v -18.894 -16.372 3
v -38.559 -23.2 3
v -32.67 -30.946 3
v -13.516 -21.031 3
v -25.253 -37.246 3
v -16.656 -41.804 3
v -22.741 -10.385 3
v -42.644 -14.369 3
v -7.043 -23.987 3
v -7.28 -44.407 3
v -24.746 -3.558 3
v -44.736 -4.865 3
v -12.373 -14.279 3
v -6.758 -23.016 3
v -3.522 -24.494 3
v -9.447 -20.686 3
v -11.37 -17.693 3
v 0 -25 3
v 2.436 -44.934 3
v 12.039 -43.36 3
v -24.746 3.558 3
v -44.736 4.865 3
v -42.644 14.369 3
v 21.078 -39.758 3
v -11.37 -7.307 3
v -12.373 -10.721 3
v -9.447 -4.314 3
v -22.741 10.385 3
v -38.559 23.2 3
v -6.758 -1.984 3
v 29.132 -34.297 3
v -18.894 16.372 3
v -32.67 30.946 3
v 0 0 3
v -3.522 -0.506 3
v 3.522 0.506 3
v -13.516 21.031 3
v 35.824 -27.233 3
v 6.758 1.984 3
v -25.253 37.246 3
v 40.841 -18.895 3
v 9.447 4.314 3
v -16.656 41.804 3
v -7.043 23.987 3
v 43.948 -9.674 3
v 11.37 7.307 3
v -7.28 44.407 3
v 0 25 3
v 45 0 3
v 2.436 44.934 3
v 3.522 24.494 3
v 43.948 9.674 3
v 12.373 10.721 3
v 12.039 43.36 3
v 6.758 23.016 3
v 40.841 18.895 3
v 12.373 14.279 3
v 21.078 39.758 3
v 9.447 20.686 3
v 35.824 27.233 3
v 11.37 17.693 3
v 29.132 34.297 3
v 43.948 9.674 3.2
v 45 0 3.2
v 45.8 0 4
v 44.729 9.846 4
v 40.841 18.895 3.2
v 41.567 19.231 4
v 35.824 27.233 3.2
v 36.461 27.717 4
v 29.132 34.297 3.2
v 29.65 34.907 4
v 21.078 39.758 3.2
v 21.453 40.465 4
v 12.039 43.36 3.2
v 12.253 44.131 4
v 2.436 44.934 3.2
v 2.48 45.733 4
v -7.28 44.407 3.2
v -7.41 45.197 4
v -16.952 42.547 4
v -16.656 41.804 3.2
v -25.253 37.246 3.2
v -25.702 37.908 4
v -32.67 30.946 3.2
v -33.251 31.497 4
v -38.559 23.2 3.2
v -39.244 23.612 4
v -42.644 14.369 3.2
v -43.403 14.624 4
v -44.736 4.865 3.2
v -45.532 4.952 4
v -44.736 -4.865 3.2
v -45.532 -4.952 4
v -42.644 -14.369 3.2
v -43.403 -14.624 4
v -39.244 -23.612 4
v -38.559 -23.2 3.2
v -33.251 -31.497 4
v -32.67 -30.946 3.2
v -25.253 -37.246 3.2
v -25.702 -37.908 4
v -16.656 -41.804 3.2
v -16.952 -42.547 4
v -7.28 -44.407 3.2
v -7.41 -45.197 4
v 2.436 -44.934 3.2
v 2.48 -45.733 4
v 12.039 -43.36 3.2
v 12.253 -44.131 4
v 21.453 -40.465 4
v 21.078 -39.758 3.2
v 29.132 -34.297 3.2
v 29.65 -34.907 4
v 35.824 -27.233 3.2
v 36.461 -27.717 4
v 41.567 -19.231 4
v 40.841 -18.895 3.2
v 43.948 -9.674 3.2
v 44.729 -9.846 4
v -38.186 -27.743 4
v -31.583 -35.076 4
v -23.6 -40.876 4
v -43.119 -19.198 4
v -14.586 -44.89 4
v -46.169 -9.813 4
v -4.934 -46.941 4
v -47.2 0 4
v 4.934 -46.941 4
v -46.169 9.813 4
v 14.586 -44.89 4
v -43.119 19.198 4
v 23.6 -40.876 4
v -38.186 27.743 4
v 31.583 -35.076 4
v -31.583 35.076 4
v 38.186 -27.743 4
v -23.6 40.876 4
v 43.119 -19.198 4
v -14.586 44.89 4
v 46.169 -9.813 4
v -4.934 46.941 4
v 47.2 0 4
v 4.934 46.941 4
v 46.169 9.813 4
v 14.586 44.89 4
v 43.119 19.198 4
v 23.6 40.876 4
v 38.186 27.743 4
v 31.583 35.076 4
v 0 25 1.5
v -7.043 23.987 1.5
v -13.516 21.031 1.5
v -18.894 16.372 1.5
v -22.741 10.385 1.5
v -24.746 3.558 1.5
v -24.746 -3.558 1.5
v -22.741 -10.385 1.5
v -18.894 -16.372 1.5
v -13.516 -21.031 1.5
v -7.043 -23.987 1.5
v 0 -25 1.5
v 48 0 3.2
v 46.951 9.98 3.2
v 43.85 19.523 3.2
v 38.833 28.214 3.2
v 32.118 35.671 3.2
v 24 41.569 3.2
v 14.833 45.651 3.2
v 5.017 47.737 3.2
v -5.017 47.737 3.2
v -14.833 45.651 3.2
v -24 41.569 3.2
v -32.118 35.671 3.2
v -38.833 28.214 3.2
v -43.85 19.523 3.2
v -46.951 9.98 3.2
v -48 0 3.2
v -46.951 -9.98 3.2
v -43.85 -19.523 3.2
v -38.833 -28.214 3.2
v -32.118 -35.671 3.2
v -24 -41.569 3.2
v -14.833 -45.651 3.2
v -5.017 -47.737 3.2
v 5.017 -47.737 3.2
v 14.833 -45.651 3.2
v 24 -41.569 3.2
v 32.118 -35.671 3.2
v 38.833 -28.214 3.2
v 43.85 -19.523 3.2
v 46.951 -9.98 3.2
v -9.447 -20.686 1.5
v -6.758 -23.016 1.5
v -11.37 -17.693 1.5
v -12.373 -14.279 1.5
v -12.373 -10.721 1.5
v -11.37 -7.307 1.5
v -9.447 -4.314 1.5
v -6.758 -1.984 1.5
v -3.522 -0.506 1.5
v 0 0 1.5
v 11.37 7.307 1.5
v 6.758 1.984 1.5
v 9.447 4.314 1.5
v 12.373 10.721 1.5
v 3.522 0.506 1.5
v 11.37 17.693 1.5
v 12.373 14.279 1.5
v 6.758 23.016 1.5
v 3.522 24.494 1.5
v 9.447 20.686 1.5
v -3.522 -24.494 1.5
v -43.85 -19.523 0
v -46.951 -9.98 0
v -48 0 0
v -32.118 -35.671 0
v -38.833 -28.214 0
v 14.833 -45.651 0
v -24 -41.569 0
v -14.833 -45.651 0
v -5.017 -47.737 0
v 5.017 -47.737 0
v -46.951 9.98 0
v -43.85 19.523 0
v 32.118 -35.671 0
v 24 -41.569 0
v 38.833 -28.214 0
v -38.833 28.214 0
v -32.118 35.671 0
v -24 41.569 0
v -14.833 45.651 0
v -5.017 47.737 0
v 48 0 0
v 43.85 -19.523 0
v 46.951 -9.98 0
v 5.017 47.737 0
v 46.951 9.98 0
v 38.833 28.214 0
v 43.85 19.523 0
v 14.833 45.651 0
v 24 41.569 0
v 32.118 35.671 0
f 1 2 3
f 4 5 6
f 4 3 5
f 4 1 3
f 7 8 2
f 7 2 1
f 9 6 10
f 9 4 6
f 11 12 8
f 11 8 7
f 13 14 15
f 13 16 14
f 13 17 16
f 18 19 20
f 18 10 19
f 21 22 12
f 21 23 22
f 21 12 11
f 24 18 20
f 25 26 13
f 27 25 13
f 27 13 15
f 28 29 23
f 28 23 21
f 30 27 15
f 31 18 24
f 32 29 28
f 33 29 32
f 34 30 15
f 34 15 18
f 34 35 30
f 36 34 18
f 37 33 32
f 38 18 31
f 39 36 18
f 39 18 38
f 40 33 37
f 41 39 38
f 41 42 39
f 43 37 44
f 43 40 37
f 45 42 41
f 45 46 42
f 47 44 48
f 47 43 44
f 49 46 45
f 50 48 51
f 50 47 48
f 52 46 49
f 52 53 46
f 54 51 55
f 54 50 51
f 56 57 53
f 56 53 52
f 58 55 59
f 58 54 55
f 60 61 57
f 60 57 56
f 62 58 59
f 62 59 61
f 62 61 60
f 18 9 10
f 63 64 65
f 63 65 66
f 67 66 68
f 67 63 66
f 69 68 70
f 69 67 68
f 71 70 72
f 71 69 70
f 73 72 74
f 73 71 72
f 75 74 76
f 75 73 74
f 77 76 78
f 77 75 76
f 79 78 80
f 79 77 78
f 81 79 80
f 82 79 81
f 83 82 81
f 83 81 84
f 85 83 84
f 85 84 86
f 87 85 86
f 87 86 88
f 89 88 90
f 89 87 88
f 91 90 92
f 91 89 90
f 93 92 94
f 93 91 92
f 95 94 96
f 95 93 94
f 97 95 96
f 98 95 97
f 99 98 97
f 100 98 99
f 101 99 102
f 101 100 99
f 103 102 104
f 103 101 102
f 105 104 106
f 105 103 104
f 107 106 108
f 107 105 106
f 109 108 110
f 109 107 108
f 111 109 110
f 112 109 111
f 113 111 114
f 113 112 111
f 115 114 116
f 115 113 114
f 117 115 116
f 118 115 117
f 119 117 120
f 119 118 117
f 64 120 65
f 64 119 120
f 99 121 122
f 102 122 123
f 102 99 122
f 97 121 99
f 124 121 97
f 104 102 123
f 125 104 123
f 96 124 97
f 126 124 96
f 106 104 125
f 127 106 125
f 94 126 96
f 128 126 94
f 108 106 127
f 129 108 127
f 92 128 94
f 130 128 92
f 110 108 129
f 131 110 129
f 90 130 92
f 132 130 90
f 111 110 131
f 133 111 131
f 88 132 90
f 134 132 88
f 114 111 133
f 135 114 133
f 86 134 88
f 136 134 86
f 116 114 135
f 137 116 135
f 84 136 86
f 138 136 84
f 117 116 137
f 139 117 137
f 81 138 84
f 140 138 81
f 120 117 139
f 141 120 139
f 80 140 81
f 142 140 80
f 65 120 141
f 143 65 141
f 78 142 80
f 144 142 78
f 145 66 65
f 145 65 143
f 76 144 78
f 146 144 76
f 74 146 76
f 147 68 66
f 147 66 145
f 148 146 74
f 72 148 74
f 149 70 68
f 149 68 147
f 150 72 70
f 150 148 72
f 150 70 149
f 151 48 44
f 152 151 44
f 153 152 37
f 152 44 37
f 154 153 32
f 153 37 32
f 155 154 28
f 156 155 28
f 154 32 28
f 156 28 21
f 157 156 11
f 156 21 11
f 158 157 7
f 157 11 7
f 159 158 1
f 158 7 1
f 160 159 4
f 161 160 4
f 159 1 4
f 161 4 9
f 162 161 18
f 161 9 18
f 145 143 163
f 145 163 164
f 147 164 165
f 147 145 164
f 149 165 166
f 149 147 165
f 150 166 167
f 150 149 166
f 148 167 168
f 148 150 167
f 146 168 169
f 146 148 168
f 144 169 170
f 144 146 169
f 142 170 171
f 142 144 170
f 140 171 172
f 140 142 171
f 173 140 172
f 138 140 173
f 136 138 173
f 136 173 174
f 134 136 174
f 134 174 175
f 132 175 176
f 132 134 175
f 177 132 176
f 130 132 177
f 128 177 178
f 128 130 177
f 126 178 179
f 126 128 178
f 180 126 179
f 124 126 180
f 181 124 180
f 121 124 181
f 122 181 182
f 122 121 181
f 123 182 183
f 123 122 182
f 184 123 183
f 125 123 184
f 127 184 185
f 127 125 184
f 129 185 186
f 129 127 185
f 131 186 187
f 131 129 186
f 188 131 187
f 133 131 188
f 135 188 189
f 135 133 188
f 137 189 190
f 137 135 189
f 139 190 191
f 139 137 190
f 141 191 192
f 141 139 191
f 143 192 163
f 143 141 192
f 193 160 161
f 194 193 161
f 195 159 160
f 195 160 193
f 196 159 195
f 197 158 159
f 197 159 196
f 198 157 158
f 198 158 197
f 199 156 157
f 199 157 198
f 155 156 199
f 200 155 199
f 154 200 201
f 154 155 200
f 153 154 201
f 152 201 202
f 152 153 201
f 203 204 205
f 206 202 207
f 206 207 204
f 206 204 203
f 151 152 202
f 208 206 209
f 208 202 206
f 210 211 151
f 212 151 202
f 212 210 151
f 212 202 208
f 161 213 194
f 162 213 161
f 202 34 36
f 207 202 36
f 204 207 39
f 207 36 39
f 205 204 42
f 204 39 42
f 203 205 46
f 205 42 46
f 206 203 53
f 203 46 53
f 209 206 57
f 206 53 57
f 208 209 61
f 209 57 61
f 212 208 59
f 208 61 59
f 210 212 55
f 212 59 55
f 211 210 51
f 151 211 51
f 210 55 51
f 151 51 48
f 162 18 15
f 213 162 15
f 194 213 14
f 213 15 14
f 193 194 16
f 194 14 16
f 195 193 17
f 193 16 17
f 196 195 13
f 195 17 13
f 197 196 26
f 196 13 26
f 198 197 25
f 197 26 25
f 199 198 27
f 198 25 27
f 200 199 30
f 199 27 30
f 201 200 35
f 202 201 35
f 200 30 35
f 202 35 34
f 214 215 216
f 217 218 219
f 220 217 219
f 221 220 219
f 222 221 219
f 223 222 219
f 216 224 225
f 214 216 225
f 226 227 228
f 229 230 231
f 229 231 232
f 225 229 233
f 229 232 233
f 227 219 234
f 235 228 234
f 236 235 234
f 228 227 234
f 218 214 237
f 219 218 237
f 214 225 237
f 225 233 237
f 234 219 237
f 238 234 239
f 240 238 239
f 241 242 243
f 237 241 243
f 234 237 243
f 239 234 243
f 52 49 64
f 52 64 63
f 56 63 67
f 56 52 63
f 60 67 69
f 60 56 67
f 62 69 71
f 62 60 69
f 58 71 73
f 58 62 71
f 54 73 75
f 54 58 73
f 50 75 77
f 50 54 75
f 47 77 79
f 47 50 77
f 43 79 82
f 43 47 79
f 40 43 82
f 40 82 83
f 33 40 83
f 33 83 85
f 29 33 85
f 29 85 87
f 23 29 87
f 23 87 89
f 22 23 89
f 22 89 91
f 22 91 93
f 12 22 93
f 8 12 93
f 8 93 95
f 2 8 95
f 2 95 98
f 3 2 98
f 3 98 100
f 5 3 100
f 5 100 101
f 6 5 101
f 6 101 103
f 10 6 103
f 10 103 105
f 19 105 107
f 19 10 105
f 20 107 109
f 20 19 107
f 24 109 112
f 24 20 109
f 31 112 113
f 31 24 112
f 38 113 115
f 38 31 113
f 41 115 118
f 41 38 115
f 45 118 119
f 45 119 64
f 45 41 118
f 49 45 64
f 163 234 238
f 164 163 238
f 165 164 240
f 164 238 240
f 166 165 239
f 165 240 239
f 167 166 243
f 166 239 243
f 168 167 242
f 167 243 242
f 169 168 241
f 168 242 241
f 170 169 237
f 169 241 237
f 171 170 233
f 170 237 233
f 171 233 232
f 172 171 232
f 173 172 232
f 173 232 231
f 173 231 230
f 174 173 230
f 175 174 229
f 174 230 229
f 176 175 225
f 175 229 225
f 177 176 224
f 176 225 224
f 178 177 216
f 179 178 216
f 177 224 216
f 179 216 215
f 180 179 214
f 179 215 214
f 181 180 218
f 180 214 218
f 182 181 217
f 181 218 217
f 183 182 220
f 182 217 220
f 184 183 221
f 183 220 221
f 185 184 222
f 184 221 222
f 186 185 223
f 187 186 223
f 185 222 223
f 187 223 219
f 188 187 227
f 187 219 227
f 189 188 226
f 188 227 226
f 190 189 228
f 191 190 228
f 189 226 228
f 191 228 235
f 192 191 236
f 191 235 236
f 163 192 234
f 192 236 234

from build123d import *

# Parameters (mm, degrees)
F0_R     = 48
F1_DEPTH = 3
F2_R     = 48
F2_R_2   = 45
F3_DEPTH = 4
F4_SIZE  = 0.8
F6_DEPTH = 1.5


with BuildPart() as f1:
    # F0 (on Top) → F1 (new body)
    with BuildSketch(Plane.XY):
        Circle(F0_R)
    extrude(amount=F1_DEPTH)

    # F2 (on Top) → F3 (join)
    with BuildSketch(Plane.XY):
        Circle(F2_R)
        Circle(F2_R_2, mode=Mode.SUBTRACT)
    extrude(amount=F3_DEPTH)

    # F4
    f4_edges = [f1.edges().sort_by_distance(p)[0] for p in [
        (-48, 0, 4),
        (-45, 0, 4),
    ]]
    chamfer(f4_edges, length=F4_SIZE)

    # F5 (on face) → F6 (cut)
    with BuildSketch(Plane.XY.offset(3)):
        with BuildLine():
            ThreePointArc((0, -25), (-12.5, -12.5), (0, 0))
            ThreePointArc((0, 0), (12.5, 12.5), (0, 25))
            ThreePointArc((0, 25), (-25, 0), (0, -25))
        make_face()
    extrude(amount=-F6_DEPTH, mode=Mode.SUBTRACT)


solid = f1.part
